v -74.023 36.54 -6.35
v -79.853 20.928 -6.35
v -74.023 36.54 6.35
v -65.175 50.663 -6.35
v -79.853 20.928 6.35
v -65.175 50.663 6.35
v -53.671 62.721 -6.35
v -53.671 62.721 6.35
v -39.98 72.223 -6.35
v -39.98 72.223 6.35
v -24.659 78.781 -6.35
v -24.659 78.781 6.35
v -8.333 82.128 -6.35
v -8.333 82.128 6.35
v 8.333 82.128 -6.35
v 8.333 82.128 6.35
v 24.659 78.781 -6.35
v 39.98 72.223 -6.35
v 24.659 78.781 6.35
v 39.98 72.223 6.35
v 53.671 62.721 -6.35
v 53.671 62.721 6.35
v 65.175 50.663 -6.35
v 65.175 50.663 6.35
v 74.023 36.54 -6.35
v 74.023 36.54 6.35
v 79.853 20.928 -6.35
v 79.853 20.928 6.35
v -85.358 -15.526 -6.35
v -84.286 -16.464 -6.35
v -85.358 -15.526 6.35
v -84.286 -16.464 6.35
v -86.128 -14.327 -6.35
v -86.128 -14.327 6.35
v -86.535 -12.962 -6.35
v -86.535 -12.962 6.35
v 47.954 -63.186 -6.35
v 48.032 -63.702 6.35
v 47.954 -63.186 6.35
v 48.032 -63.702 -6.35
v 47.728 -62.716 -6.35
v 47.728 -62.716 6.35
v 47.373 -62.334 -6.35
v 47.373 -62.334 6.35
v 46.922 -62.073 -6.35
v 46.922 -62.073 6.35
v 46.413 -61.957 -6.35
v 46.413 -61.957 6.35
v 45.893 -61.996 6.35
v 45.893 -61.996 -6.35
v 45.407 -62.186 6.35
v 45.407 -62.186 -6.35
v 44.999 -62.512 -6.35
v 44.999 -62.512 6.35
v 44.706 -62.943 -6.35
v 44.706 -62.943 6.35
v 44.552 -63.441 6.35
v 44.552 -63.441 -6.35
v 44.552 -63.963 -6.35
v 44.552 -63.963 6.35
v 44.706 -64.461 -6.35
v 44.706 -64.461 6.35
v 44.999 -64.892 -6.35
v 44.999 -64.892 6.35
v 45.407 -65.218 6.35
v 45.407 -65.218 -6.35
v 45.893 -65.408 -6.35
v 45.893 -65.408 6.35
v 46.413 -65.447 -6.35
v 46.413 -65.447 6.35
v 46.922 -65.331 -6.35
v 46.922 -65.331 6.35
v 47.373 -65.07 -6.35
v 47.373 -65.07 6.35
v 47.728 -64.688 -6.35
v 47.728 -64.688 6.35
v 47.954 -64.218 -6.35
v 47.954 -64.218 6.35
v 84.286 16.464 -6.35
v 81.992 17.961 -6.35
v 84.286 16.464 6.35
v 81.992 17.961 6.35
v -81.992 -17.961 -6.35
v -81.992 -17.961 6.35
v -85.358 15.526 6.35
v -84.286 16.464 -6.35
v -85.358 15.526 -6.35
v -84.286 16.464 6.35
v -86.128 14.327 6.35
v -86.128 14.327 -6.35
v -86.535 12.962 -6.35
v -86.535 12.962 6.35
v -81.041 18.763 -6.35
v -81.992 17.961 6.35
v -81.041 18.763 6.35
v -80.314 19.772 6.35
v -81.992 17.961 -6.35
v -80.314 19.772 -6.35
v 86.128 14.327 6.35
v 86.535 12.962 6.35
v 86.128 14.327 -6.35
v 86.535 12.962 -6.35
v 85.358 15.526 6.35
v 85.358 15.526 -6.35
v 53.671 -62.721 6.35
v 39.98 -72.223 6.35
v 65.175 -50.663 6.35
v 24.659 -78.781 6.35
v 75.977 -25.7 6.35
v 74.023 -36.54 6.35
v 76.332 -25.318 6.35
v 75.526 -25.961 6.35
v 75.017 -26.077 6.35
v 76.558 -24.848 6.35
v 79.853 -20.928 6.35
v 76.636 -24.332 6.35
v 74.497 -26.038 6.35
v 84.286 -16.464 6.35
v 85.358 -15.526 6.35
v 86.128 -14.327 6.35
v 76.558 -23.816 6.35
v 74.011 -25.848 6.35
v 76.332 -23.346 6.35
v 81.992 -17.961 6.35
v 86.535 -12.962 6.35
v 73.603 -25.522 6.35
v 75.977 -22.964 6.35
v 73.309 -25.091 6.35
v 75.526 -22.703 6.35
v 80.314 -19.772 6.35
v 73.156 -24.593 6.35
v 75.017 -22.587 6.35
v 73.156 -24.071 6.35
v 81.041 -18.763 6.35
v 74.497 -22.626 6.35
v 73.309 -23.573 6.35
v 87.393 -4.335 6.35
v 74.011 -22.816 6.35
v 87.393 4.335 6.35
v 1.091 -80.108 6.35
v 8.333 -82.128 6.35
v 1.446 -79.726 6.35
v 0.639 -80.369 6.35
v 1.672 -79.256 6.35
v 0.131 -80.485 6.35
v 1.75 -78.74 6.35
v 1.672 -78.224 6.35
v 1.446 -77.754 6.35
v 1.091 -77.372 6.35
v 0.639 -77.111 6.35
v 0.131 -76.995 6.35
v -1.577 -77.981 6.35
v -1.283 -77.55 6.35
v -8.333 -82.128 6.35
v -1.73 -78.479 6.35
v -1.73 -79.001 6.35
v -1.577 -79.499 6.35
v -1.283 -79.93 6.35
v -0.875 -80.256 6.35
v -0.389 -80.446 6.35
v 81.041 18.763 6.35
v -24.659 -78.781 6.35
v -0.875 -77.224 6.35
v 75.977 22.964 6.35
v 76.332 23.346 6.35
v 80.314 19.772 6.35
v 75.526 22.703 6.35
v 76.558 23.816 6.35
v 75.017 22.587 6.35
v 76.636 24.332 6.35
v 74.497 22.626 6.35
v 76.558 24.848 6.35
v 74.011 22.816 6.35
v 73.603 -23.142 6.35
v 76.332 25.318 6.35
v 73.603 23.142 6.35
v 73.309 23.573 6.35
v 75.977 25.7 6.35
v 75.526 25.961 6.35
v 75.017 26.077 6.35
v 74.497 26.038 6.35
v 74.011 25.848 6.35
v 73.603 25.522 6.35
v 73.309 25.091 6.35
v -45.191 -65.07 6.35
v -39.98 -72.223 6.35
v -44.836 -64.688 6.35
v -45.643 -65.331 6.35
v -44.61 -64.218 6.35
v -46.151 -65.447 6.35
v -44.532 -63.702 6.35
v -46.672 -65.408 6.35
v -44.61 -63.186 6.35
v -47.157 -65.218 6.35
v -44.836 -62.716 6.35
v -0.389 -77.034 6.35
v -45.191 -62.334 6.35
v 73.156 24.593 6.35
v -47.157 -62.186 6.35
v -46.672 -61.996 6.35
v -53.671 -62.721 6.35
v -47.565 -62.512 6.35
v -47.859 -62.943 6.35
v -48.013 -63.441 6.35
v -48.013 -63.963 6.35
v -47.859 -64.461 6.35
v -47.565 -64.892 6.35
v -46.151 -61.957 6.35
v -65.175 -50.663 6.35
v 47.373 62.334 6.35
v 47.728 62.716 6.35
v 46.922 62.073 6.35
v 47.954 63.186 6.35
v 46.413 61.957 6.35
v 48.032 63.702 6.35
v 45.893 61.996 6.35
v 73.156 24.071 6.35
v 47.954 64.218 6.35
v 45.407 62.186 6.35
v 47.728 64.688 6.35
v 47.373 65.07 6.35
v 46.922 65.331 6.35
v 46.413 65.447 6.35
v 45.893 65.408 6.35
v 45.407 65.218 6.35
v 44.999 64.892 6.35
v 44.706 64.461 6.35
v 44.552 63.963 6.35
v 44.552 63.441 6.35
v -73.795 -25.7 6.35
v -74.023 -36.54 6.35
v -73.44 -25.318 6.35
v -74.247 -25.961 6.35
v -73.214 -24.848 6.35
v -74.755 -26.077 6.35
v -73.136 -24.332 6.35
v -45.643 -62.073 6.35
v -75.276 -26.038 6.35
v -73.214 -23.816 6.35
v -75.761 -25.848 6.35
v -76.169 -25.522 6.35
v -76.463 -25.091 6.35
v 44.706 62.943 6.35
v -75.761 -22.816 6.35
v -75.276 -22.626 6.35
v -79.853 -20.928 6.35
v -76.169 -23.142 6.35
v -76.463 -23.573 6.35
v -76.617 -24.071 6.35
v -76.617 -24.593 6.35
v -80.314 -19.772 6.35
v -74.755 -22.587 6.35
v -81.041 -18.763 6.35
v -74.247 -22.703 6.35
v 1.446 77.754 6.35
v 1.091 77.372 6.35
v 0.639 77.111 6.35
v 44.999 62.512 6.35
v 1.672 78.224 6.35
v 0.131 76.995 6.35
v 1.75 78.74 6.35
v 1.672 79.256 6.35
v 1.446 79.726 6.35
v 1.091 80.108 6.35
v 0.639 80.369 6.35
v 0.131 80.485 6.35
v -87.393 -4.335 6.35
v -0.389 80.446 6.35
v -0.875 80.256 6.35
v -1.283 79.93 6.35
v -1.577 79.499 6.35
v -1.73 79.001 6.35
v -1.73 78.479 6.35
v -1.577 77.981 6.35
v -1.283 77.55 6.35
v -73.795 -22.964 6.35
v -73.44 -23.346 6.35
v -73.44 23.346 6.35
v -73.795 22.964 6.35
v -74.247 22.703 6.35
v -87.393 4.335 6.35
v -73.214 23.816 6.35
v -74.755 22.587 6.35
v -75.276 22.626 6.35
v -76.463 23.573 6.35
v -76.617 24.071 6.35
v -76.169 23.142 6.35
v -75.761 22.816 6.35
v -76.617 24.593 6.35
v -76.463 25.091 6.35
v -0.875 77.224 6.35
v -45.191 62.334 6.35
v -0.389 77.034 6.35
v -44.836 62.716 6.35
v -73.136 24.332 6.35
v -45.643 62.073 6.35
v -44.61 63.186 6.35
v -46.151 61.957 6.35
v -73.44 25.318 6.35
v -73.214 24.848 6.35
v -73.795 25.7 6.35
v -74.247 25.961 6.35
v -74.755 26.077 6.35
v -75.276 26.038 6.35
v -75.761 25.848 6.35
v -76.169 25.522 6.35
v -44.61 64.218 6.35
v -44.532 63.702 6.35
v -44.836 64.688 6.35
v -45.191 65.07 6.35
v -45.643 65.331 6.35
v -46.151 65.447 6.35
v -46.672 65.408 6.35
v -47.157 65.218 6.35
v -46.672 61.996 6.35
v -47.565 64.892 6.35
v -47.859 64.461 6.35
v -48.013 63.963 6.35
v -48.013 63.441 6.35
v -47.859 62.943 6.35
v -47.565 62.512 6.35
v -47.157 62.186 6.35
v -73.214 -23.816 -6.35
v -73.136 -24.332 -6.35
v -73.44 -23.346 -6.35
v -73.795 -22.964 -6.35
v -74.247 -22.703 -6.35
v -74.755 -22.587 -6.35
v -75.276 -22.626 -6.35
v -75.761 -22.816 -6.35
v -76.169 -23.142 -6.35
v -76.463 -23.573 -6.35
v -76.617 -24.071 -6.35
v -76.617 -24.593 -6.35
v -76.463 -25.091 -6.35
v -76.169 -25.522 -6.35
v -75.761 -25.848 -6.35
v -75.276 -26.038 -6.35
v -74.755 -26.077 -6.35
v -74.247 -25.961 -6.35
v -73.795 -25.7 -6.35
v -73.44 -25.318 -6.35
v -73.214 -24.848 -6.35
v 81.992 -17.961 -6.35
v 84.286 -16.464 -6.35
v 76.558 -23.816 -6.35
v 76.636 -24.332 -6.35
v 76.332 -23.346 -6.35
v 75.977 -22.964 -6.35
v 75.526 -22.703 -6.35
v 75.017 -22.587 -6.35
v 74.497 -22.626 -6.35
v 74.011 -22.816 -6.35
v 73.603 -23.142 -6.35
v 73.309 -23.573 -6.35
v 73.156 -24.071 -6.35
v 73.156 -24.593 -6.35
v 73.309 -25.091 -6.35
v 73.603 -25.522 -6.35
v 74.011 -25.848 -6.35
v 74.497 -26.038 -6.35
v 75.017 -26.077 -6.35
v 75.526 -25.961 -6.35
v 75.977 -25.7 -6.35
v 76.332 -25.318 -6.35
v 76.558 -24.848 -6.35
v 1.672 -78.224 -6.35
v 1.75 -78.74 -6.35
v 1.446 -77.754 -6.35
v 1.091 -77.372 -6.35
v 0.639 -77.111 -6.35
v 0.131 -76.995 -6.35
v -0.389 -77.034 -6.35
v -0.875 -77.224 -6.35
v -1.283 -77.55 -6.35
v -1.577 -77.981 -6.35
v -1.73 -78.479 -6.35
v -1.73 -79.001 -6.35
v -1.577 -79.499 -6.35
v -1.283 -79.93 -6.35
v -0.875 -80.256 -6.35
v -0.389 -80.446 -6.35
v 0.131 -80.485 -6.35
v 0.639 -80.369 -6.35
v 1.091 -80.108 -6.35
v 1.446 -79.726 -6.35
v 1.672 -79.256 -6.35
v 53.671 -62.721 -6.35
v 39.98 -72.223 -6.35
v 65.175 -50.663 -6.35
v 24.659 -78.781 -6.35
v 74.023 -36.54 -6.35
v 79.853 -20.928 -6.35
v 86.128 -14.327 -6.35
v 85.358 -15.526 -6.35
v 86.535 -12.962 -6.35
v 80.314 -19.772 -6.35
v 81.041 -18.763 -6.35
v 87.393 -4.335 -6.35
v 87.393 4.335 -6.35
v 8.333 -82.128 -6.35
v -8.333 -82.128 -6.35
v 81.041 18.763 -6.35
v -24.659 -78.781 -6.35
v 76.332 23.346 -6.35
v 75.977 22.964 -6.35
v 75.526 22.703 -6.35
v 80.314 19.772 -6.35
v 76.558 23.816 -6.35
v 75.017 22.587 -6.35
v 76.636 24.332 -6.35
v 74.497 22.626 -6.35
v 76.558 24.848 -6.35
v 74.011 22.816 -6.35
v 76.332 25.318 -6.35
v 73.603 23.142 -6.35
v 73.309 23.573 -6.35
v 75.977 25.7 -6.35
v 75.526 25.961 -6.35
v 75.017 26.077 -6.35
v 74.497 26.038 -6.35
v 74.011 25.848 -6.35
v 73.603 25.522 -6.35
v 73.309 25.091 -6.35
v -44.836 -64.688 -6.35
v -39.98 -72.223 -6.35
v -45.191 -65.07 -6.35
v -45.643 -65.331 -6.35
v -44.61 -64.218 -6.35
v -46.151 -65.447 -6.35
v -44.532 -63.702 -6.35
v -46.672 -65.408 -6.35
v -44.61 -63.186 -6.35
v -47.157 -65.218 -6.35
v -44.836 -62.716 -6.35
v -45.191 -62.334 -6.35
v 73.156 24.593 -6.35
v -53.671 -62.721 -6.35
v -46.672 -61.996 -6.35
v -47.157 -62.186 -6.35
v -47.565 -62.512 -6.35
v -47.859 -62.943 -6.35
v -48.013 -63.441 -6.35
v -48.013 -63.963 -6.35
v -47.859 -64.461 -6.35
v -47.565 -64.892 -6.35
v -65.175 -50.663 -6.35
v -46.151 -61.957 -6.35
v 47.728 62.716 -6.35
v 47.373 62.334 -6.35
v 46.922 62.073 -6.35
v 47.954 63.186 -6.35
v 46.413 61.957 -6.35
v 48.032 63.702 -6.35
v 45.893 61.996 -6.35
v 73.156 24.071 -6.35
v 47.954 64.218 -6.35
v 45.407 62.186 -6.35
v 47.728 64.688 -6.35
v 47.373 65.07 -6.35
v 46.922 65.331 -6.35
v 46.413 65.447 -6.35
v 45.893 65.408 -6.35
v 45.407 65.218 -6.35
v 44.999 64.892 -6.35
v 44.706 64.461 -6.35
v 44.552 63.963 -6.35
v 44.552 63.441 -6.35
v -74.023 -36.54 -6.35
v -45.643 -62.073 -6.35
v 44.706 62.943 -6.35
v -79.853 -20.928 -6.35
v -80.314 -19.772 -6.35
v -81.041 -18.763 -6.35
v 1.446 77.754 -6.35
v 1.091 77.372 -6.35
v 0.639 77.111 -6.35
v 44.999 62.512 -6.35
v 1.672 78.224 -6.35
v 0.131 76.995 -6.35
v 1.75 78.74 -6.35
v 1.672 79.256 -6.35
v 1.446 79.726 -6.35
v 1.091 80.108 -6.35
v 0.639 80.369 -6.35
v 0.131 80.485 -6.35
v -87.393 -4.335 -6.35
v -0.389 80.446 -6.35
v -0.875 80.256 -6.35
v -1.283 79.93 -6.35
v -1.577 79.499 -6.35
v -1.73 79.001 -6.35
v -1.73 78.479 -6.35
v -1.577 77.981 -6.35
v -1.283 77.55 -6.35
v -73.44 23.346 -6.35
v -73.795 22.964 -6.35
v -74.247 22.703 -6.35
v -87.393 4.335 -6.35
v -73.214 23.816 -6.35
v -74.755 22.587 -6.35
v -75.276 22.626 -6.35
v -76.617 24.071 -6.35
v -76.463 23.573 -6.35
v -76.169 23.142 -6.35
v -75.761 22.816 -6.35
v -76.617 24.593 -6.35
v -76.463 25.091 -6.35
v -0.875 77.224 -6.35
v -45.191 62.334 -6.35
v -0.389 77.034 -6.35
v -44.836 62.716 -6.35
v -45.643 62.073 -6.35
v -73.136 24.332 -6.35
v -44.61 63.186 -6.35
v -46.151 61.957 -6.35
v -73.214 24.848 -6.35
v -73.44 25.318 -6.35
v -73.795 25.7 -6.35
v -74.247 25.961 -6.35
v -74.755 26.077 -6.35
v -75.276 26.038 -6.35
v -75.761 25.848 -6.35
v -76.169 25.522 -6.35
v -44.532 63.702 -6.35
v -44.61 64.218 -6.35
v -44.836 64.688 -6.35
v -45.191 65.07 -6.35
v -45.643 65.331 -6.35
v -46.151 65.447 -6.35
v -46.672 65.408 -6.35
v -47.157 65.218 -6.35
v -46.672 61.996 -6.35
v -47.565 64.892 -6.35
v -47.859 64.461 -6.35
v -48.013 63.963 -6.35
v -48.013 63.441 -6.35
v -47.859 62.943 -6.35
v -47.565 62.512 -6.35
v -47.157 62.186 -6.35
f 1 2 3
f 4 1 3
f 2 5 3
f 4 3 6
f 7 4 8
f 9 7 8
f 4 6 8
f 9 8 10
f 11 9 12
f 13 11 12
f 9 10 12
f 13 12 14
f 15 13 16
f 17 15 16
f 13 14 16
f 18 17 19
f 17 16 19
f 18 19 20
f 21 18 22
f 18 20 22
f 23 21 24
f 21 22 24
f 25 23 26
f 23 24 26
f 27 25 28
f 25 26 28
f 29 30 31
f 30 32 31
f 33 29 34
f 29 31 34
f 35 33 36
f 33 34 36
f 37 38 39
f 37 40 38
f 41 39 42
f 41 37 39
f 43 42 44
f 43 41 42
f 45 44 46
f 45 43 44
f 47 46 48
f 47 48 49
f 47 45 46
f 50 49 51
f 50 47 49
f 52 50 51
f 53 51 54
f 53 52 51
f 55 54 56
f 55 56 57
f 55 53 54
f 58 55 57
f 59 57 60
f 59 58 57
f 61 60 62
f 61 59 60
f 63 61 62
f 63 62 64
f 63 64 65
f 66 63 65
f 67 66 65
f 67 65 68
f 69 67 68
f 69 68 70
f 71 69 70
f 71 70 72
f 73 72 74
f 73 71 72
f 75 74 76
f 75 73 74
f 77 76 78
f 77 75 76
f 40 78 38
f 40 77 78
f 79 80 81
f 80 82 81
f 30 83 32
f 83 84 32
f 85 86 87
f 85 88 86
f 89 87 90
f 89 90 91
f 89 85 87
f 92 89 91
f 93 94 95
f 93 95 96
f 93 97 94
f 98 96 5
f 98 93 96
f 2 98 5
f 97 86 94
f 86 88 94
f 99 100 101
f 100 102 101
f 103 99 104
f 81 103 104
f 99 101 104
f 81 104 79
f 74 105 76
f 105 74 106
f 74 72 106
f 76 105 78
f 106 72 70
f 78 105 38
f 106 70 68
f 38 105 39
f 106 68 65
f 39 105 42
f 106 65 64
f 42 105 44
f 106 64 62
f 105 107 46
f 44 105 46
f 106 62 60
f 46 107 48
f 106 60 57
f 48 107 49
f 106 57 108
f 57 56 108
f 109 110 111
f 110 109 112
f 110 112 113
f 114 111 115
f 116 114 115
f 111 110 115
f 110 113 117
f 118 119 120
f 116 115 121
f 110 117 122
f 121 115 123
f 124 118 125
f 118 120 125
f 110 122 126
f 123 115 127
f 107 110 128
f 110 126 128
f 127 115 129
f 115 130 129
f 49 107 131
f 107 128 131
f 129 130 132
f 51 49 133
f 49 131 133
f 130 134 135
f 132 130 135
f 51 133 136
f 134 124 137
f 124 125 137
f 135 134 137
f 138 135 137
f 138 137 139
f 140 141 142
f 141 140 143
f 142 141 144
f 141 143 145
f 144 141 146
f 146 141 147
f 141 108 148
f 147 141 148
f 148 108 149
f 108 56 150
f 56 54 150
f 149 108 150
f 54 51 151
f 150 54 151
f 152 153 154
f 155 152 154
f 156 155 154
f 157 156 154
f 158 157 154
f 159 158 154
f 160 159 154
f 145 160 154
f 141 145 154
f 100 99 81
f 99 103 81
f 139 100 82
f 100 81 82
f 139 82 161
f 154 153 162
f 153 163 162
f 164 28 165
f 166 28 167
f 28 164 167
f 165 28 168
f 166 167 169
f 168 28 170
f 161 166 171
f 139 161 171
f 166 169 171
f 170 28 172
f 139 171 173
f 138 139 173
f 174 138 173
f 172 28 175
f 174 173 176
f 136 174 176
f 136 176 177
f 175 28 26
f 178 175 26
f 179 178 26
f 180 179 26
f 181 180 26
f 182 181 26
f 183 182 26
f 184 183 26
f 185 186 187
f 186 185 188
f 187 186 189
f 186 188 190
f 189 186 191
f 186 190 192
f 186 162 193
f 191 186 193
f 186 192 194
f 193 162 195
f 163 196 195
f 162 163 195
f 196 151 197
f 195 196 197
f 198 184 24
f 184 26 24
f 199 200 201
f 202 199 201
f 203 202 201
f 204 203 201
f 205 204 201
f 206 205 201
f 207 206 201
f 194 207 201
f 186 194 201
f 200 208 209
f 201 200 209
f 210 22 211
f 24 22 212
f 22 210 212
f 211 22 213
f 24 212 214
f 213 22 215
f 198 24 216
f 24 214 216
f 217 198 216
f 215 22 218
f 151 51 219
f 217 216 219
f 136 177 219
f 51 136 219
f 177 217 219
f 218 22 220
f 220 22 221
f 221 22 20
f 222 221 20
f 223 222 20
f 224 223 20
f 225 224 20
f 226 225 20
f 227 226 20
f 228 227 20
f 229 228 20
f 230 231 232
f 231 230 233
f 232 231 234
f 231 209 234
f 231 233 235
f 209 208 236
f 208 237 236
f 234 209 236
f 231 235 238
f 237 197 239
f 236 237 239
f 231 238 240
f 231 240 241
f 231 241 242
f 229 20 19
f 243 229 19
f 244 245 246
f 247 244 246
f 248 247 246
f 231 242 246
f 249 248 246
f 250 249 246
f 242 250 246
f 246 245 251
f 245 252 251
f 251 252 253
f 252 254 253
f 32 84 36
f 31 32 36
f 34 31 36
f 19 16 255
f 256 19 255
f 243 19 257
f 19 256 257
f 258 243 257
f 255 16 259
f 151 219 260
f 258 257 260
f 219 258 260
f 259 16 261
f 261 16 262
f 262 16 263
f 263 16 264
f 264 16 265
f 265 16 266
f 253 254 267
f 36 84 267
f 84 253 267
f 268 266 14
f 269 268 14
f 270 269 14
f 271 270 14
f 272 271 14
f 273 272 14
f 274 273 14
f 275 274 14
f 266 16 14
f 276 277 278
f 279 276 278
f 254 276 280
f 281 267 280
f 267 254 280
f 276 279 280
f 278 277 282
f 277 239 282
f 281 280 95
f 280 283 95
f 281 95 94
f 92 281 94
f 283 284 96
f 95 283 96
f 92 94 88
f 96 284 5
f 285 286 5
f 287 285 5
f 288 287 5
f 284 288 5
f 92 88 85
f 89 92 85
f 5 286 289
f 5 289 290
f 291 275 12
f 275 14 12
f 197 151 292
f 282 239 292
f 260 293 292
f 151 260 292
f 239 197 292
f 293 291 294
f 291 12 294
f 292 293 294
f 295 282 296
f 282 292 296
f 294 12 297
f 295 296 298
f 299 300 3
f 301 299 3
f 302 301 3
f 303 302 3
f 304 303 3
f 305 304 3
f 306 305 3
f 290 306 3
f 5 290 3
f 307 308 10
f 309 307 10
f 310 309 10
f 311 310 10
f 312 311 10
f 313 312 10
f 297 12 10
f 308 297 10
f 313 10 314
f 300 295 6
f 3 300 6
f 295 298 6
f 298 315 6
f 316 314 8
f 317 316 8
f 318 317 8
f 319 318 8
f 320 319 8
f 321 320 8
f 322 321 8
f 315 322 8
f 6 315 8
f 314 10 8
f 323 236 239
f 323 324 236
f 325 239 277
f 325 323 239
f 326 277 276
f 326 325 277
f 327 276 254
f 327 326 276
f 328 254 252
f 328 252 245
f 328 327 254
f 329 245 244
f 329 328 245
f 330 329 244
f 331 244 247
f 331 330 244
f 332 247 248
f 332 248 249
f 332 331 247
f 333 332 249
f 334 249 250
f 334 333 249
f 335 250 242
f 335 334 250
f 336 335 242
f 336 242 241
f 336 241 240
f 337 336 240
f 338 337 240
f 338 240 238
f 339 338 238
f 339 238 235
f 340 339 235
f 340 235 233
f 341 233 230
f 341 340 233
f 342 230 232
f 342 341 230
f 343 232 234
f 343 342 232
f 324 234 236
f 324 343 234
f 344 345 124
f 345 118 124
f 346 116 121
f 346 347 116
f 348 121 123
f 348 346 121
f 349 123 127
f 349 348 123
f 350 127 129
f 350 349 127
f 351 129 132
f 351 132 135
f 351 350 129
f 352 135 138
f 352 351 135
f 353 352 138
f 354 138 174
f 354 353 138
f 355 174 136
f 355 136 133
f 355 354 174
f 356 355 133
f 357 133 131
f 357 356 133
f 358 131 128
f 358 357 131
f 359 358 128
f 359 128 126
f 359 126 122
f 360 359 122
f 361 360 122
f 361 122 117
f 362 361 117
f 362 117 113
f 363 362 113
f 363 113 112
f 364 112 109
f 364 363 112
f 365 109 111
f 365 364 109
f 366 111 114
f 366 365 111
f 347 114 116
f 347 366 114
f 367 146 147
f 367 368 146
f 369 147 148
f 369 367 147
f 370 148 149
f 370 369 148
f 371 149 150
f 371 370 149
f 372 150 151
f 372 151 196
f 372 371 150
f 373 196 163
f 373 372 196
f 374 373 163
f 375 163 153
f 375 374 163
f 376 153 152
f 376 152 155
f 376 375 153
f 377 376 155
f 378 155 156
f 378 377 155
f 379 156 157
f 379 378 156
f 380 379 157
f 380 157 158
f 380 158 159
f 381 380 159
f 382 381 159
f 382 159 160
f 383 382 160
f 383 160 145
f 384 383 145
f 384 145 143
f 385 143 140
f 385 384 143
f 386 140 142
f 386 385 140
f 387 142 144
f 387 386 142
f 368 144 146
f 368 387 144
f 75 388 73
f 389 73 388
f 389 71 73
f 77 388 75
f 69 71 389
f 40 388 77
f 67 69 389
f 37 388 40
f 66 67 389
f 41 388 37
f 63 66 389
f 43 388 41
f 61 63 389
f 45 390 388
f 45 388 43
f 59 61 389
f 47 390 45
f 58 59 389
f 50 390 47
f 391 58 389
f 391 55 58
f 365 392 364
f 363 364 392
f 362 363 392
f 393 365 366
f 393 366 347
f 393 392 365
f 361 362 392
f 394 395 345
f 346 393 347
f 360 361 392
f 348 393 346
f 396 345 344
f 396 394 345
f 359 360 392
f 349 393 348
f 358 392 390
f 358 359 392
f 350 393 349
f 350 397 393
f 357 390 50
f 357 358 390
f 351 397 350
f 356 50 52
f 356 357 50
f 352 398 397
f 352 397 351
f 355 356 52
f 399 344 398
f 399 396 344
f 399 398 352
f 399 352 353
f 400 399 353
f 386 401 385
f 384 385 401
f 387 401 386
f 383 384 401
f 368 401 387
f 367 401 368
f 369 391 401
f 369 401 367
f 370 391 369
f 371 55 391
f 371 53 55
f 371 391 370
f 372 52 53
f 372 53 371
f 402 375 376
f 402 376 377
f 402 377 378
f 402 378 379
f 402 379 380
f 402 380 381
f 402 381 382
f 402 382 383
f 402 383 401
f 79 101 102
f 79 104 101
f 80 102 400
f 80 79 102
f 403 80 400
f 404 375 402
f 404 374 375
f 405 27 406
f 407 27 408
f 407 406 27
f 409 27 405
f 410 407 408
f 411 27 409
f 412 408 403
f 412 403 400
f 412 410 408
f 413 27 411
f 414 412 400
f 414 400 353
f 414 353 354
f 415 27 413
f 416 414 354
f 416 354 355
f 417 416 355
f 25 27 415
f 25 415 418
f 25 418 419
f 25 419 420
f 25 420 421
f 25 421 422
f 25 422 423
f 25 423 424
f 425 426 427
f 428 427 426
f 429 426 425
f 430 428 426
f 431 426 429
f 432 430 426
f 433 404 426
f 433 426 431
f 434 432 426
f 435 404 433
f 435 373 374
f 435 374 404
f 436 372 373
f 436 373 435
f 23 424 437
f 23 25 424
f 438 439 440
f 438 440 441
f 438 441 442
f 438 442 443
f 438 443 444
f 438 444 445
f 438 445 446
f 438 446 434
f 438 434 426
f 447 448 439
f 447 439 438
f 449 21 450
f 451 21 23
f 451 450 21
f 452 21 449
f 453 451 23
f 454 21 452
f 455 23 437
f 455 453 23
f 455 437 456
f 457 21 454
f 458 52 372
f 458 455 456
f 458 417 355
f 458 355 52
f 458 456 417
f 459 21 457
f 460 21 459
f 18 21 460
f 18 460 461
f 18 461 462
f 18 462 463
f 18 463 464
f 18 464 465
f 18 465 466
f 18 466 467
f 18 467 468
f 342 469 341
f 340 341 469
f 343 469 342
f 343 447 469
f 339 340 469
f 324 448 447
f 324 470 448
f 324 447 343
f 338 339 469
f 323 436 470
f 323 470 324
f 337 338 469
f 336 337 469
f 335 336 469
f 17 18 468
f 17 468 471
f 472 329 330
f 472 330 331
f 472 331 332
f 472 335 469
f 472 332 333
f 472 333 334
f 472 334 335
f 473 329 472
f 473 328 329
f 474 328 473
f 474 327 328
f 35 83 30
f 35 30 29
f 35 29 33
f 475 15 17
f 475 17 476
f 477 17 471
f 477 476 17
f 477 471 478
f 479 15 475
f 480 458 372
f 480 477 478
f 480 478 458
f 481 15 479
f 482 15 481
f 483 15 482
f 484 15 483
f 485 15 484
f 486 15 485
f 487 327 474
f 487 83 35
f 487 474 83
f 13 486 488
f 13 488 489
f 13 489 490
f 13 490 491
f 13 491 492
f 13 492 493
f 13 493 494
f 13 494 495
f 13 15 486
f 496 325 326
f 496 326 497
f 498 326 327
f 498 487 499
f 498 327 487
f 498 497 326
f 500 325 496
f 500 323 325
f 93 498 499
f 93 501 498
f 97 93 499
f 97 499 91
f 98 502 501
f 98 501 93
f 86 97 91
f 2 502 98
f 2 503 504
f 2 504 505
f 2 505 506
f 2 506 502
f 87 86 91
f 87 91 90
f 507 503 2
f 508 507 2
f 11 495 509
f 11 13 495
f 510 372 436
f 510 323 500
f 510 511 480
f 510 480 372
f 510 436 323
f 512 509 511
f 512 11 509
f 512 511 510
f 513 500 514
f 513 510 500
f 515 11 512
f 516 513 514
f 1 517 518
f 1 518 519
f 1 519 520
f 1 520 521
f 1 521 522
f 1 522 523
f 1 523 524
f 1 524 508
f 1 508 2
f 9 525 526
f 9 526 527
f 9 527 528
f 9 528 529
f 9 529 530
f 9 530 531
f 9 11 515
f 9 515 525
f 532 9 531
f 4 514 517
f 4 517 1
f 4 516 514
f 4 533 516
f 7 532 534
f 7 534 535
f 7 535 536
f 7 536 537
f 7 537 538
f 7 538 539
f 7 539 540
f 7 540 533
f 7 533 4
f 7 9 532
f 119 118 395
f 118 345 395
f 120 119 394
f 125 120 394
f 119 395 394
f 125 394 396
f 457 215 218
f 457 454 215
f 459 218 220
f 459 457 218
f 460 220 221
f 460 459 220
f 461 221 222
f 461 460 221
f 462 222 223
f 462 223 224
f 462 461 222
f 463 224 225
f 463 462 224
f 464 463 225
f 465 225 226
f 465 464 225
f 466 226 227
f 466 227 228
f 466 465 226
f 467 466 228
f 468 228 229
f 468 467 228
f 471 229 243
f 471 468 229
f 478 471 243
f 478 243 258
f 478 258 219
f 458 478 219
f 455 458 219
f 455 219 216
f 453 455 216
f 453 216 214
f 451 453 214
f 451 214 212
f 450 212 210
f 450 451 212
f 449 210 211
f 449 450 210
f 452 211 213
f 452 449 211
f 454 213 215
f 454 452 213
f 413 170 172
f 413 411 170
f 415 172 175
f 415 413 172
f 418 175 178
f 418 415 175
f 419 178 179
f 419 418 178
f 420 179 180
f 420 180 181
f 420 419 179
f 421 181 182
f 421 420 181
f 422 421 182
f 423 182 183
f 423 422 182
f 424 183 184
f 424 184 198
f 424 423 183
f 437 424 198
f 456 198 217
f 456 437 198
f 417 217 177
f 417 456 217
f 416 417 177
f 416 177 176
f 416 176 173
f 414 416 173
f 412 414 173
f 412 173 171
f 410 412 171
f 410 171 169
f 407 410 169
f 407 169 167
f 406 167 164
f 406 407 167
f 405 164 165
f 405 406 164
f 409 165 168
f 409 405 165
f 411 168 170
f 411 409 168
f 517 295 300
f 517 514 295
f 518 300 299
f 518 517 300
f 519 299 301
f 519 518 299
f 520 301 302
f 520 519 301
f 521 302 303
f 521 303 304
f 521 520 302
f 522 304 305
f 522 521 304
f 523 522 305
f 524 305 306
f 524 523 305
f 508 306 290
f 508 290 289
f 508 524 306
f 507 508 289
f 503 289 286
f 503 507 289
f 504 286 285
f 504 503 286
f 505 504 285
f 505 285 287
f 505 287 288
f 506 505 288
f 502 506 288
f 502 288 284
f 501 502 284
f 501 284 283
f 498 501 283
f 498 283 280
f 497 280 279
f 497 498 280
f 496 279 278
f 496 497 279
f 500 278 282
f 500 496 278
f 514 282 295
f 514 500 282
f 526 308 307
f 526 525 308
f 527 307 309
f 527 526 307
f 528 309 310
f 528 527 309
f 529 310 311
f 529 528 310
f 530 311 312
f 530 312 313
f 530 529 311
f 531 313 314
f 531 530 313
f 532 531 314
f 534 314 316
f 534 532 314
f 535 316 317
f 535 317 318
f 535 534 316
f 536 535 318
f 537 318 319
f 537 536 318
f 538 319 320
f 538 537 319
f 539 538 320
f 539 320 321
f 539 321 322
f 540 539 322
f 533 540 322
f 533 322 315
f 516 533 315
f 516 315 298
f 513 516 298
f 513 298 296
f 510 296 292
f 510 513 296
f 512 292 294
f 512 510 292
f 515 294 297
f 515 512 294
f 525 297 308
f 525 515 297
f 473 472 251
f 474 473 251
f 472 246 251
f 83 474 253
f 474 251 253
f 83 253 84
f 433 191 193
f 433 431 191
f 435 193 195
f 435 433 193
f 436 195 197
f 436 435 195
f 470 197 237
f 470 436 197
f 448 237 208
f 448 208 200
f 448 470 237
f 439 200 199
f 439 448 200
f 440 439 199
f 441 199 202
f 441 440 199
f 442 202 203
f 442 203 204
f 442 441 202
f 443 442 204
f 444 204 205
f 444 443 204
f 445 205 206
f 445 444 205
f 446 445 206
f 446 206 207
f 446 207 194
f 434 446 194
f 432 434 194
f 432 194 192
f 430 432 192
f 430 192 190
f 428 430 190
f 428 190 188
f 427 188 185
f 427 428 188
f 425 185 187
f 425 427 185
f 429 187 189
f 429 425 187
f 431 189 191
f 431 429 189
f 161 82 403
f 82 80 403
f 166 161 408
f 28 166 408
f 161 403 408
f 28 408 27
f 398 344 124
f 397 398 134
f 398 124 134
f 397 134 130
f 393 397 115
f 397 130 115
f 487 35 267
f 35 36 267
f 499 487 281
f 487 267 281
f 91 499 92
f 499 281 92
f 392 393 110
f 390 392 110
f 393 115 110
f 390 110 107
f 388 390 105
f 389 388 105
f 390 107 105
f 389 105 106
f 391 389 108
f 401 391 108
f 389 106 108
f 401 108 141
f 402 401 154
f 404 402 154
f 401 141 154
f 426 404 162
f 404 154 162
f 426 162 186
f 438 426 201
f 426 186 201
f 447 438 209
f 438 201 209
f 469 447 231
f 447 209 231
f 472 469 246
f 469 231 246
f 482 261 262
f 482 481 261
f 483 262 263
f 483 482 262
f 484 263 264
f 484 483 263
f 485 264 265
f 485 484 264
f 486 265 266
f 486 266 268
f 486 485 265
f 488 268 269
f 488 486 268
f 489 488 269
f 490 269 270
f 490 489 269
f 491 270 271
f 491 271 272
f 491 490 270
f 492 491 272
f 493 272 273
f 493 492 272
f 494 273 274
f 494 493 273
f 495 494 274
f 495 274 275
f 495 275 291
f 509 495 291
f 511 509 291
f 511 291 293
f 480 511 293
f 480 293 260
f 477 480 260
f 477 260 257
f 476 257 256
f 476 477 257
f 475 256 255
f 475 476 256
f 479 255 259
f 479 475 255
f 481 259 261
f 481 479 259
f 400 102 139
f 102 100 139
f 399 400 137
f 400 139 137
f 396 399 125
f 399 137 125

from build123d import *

# Parameters (mm, degrees)
SKETCH1_R           = 1.75
BOSS_EXTRUDE1_DEPTH = 6.35
FILLET1_R           = 5.08


with BuildPart() as part:
    # Sketch1 → Boss-Extrude1 (new, symmetric)
    with BuildSketch(Plane.XY):
        with BuildLine():
            Line((-86.162592811, 15.24), (-80.321852568, 19.05))
            ThreePointArc((-80.321852568, 19.05), (0, 82.55), (80.321852568, 19.05))
            Line((80.321852568, 19.05), (86.162592811, 15.24))
            ThreePointArc((86.162592811, 15.24), (87.5, 0), (86.162592811, -15.24))
            Line((86.162592811, -15.24), (80.321852568, -19.05))
            ThreePointArc((80.321852568, -19.05), (0, -82.55), (-80.321852568, -19.05))
            Line((-80.321852568, -19.05), (-86.162592811, -15.24))
            ThreePointArc((-86.162592811, -15.24), (-87.5, 0), (-86.162592811, 15.24))
        make_face()
        with Locations((0, 78.74)):
            Circle(SKETCH1_R, mode=Mode.SUBTRACT)
        with Locations((46.282210766, 63.701998137)):
            Circle(SKETCH1_R, mode=Mode.SUBTRACT)
        with Locations((74.886190093, 24.331998137)):
            Circle(SKETCH1_R, mode=Mode.SUBTRACT)
        with Locations((74.886190093, -24.331998137)):
            Circle(SKETCH1_R, mode=Mode.SUBTRACT)
        with Locations((46.282210766, -63.701998137)):
            Circle(SKETCH1_R, mode=Mode.SUBTRACT)
        with Locations((0, -78.74)):
            Circle(SKETCH1_R, mode=Mode.SUBTRACT)
        with Locations((-46.282210766, -63.701998137)):
            Circle(SKETCH1_R, mode=Mode.SUBTRACT)
        with Locations((-74.886190093, -24.331998137)):
            Circle(SKETCH1_R, mode=Mode.SUBTRACT)
        with Locations((-74.886190093, 24.331998137)):
            Circle(SKETCH1_R, mode=Mode.SUBTRACT)
        with Locations((-46.282210766, 63.701998137)):
            Circle(SKETCH1_R, mode=Mode.SUBTRACT)
    extrude(amount=BOSS_EXTRUDE1_DEPTH, both=True)

    # Fillet1
    fillet1_edges = [part.edges().sort_by_distance(p)[0] for p in [
        (-86.162592811, -15.24, 0),
        (-86.162592811, 15.24, 0),
        (-80.321852568, 19.05, 0),
        (80.321852568, 19.05, 0),
        (86.162592811, 15.24, 0),
        (86.162592811, -15.24, 0),
        (80.321852568, -19.05, 0),
        (-80.321852568, -19.05, 0),
    ]]
    fillet(fillet1_edges, radius=FILLET1_R)


solid = part.part
